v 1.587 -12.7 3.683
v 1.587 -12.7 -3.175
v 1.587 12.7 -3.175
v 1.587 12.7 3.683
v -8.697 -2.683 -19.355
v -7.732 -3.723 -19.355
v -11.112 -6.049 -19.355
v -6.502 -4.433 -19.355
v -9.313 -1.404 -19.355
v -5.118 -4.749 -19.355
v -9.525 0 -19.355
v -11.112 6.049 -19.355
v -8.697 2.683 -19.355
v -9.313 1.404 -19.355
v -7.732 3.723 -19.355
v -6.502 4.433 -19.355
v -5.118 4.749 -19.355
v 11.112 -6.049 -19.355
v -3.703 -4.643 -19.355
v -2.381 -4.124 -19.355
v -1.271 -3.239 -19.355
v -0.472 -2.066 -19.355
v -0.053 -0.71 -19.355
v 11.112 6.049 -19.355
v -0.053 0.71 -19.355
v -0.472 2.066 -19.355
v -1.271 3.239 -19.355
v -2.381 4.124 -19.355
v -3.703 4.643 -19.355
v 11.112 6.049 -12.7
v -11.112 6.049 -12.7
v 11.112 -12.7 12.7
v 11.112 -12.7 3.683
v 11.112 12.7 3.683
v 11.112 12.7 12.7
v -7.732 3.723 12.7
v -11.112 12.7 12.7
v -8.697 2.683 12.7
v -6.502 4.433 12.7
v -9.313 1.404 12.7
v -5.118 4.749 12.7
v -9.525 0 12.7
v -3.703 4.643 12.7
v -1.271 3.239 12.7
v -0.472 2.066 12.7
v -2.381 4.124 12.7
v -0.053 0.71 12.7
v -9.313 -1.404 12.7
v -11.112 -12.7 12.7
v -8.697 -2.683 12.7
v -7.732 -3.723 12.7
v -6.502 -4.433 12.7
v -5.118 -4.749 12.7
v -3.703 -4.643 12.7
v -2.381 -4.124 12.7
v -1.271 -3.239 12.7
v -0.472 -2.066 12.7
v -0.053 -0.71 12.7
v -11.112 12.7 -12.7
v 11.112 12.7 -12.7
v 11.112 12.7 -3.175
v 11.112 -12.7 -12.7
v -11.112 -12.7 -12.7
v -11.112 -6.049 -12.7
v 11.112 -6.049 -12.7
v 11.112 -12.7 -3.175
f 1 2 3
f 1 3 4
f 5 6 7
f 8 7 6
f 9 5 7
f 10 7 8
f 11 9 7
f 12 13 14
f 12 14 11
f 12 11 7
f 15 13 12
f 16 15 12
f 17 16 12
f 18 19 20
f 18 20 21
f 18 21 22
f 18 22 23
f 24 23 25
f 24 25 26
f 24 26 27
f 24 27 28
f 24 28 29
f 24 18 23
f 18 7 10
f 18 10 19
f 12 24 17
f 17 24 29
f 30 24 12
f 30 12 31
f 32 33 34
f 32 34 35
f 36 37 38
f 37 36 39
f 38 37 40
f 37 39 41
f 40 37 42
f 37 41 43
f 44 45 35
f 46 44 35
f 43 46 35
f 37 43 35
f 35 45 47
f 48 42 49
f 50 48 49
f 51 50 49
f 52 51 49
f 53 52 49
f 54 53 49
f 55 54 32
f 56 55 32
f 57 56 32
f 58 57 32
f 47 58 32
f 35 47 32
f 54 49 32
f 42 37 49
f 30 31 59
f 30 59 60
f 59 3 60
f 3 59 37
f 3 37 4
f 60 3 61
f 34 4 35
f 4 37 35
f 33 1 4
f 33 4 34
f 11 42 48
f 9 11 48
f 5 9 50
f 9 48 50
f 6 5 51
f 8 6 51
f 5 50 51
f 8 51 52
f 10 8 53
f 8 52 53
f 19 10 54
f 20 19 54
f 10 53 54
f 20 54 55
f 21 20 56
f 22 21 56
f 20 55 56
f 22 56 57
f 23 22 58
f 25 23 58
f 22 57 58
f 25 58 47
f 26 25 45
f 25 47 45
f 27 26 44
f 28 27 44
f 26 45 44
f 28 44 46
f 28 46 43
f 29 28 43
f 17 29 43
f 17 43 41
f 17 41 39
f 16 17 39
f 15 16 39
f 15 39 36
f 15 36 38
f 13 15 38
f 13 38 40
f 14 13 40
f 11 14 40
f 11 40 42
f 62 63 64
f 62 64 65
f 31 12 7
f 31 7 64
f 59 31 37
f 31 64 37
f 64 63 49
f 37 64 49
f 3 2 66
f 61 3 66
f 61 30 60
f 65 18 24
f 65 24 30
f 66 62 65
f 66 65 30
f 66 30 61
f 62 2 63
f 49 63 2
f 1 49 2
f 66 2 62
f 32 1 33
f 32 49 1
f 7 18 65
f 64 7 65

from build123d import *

# Parameters (mm, degrees)
F0_W     = 22.225
F0_H     = 25.4
F1_DEPTH = 12.7
F2_W     = 9.525
F2_H     = 6.858
F6_DEPTH = 25.401
F7_W     = 12.098386
F7_H     = 6.654872
F3_DEPTH = 22.225
F4_DEPTH = 32.055872


with BuildPart() as f1:
    # F0 (on Front) → F1 (new body, symmetric)
    with BuildSketch(Plane.XZ):
        Rectangle(F0_W, F0_H)
    extrude(amount=F1_DEPTH, both=True)

    # F2 (on face) → F6 (cut, through all)
    with BuildSketch(Plane.XZ.offset(12.7)):
        with Locations((6.35, 0.254)):
            Rectangle(F2_W, F2_H)
    extrude(amount=-F6_DEPTH, mode=Mode.SUBTRACT)

    # F7 (on face) → F3 (join, through all)
    with BuildSketch(Plane.YZ.offset(11.1125)):
        with Locations((0, -16.027436)):
            Rectangle(F7_W, F7_H)
    extrude(amount=-F3_DEPTH)

    # F8 (on face) → F4 (cut, through all)
    with BuildSketch(Plane.XY.offset(12.7)):
        with BuildLine():
            Line((-9.525, 0), (0, 0))
            ThreePointArc((0, 0), (-4.7625, 4.7625), (-9.525, 0))
        make_face()
        with BuildLine():
            ThreePointArc((-9.525, 0), (-4.7625, -4.7625), (0, 0))
            Line((0, 0), (-9.525, 0))
        make_face()
    extrude(amount=-F4_DEPTH, mode=Mode.SUBTRACT)


solid = f1.part
